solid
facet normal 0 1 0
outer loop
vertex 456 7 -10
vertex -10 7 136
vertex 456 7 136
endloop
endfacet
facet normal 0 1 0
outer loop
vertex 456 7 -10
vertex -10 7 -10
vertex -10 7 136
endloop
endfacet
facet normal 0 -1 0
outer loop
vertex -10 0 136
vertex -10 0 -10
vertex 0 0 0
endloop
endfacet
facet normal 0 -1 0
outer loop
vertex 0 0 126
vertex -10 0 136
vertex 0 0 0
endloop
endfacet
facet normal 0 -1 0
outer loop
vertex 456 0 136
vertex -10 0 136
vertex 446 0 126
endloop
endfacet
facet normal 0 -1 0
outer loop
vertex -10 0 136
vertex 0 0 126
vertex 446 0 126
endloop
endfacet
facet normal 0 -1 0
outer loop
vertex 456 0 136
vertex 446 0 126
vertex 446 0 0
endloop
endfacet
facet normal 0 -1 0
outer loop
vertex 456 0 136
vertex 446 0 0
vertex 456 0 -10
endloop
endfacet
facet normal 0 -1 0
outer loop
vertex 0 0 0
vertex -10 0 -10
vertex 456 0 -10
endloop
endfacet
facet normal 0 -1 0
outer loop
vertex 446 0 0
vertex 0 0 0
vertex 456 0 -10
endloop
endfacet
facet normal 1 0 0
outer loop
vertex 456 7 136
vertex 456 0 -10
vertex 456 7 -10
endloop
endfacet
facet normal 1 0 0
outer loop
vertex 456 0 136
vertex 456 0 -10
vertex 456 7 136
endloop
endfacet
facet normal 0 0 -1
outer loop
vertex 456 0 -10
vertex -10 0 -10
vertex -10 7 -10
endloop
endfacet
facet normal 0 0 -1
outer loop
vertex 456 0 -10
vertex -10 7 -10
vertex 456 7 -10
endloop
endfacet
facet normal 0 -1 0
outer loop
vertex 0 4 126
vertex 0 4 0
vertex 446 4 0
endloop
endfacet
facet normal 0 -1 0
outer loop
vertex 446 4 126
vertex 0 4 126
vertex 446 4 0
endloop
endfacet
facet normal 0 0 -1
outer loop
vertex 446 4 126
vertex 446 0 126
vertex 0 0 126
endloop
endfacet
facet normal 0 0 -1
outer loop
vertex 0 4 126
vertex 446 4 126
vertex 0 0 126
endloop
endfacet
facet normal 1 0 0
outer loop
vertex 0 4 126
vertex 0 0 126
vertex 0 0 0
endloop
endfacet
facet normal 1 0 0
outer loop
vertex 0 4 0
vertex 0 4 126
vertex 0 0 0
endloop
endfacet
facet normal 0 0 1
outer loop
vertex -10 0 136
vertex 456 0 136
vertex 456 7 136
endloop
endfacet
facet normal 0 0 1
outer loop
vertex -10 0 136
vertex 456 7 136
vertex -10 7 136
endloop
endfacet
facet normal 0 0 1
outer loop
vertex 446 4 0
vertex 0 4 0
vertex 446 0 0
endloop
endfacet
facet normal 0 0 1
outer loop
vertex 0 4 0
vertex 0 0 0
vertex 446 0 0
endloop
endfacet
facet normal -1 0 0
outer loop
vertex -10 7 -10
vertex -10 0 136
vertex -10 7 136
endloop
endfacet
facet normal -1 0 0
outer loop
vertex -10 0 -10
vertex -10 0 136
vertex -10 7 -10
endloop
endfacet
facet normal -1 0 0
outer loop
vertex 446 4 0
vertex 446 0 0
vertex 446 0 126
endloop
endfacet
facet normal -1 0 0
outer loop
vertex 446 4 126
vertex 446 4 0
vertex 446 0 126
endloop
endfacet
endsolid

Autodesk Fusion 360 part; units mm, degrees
sketch "Sketch1" plane through (0, 0, 0) normal (0, 1, 0) x (1, 0, 0)
  line L0 (0, 0) -> (446, 0)
  line L1 (446, 0) -> (446, -126)
  line L2 (446, -126) -> (0, -126)
  line L3 (0, -126) -> (0, 0)
  line L4 (-10, 10) -> (456, 10)
  line L5 (456, 10) -> (456, -136)
  line L6 (456, -136) -> (-10, -136)
  line L7 (-10, -136) -> (-10, 10)
  dimension "d1" = 446
  dimension "d2" = 126
  dimension "d3" = 466
  dimension "d4" = 146
  dimension "d5" = 10
  dimension "d6" = 10
extrude "Extrude1" add sketch "Sketch1" along normal blind 5 contours L0 L1 L2 L3 | L4 L5 L6 L7
extrude "Extrude2" cut sketch "Sketch1" along normal blind 4 contours L0 L1 L2 L3
extrude "Extrude3" add 1 faces at (145.3333, 5, 38.6667) along direction (0, 1, 0) blind 2
sketch "Sketch2" plane through (0, 0, 0) normal (0, 1, 0) x (1, 0, 0)
  line L0 (9, -114) -> (23, -114)
  line L1 (23, -114) -> (23, -100)
  line L2 (23, -100) -> (9, -100)
  line L3 (9, -100) -> (9, -114)
  line L4 (28, -113.6288) -> (42, -113.6288)
  line L5 (42, -113.6288) -> (42, -99.6288)
  line L6 (42, -99.6288) -> (28, -99.6288)
  line L7 (28, -99.6288) -> (28, -113.6288)
  line L8 (0, 0) -> (0, -126)
  line L9 (0, -126) -> (446, -126)
  line L10 (47, -113.6288) -> (61, -113.6288)
  line L11 (47, -99.6288) -> (47, -113.6288)
  line L12 (61, -113.6288) -> (61, -99.6288)
  line L13 (61, -99.6288) -> (47, -99.6288)
  line L14 (80, -113.6288) -> (80, -99.6288)
  line L15 (66, -113.6288) -> (80, -113.6288)
  line L16 (66, -99.6288) -> (66, -113.6288)
  line L17 (80, -99.6288) -> (66, -99.6288)
  line L18 (156, -113.6288) -> (156, -99.6288)
  line L19 (142, -113.6288) -> (156, -113.6288)
  line L20 (142, -99.6288) -> (142, -113.6288)
  line L21 (156, -99.6288) -> (142, -99.6288)
  line L22 (137, -113.6288) -> (137, -99.6288)
  line L23 (123, -99.6288) -> (123, -113.6288)
  line L24 (123, -113.6288) -> (137, -113.6288)
  line L25 (137, -99.6288) -> (123, -99.6288)
  line L26 (118, -113.6288) -> (118, -99.6288)
  line L27 (104, -113.6288) -> (118, -113.6288)
  line L28 (104, -99.6288) -> (104, -113.6288)
  line L29 (118, -99.6288) -> (104, -99.6288)
  line L30 (99, -114) -> (99, -100)
  line L31 (85, -114) -> (99, -114)
  line L32 (85, -100) -> (85, -114)
  line L33 (99, -100) -> (85, -100)
  line L34 (307.2, -113.6288) -> (321.2, -113.6288)
  line L35 (218, -113.6288) -> (232, -113.6288)
  line L36 (345.2, -113.6288) -> (359.2, -113.6288)
  line L37 (307.2, -99.6288) -> (307.2, -113.6288)
  line L38 (161, -114) -> (175, -114)
  line L39 (232, -113.6288) -> (232, -99.6288)
  line L40 (345.2, -99.6288) -> (345.2, -113.6288)
  line L41 (359.2, -99.6288) -> (345.2, -99.6288)
  line L42 (340.2, -113.6288) -> (340.2, -99.6288)
  line L43 (326.2, -99.6288) -> (326.2, -113.6288)
  line L44 (326.2, -113.6288) -> (340.2, -113.6288)
  line L45 (359.2, -113.6288) -> (359.2, -99.6288)
  line L46 (340.2, -99.6288) -> (326.2, -99.6288)
  line L47 (321.2, -113.6288) -> (321.2, -99.6288)
  line L48 (237, -114) -> (251, -114)
  line L49 (251, -114) -> (251, -100)
  line L50 (321.2, -99.6288) -> (307.2, -99.6288)
  line L51 (232, -99.6288) -> (218, -99.6288)
  line L52 (237, -100) -> (237, -114)
  line L53 (251, -100) -> (237, -100)
  line L54 (161, -100) -> (161, -114)
  line L55 (175, -114) -> (175, -100)
  line L56 (175, -100) -> (161, -100)
  line L57 (180, -99.6288) -> (180, -113.6288)
  line L58 (218, -99.6288) -> (218, -113.6288)
  line L59 (194, -113.6288) -> (194, -99.6288)
  line L60 (199, -113.6288) -> (213, -113.6288)
  line L61 (199, -99.6288) -> (199, -113.6288)
  line L62 (213, -113.6288) -> (213, -99.6288)
  line L63 (213, -99.6288) -> (199, -99.6288)
  line L64 (180, -113.6288) -> (194, -113.6288)
  line L65 (194, -99.6288) -> (180, -99.6288)
  line L66 (321.2, -94.6288) -> (321.2, -80.6288)
  line L67 (85, -95) -> (99, -95)
  line L68 (307.2, -80.6288) -> (307.2, -94.6288)
  line L69 (345.2, -94.6288) -> (359.2, -94.6288)
  line L70 (85, -81) -> (85, -95)
  line L71 (80, -80.6288) -> (66, -80.6288)
  line L72 (326.2, -94.6288) -> (340.2, -94.6288)
  line L73 (66, -94.6288) -> (80, -94.6288)
  line L74 (321.2, -80.6288) -> (307.2, -80.6288)
  line L75 (251, -95) -> (251, -81)
  line L76 (307.2, -94.6288) -> (321.2, -94.6288)
  line L77 (175, -81) -> (161, -81)
  line L78 (345.2, -80.6288) -> (345.2, -94.6288)
  line L79 (237, -81) -> (237, -95)
  line L80 (340.2, -94.6288) -> (340.2, -80.6288)
  line L81 (326.2, -80.6288) -> (326.2, -94.6288)
  line L82 (194, -80.6288) -> (180, -80.6288)
  line L83 (175, -95) -> (175, -81)
  line L84 (199, -80.6288) -> (199, -94.6288)
  line L85 (218, -94.6288) -> (232, -94.6288)
  line L86 (359.2, -80.6288) -> (345.2, -80.6288)
  line L87 (180, -80.6288) -> (180, -94.6288)
  line L88 (194, -94.6288) -> (194, -80.6288)
  line L89 (237, -95) -> (251, -95)
  line L90 (232, -94.6288) -> (232, -80.6288)
  line L91 (218, -80.6288) -> (218, -94.6288)
  line L92 (340.2, -80.6288) -> (326.2, -80.6288)
  line L93 (213, -80.6288) -> (199, -80.6288)
  line L94 (161, -95) -> (175, -95)
  line L95 (251, -81) -> (237, -81)
  line L96 (156, -94.6288) -> (156, -80.6288)
  line L97 (199, -94.6288) -> (213, -94.6288)
  line L98 (213, -94.6288) -> (213, -80.6288)
  line L99 (232, -80.6288) -> (218, -80.6288)
  line L100 (161, -81) -> (161, -95)
  line L101 (180, -94.6288) -> (194, -94.6288)
  line L102 (61, -94.6288) -> (61, -80.6288)
  line L103 (156, -80.6288) -> (142, -80.6288)
  line L104 (42, -80.6288) -> (28, -80.6288)
  line L105 (28, -80.6288) -> (28, -94.6288)
  line L106 (9, -81) -> (9, -95)
  line L107 (142, -94.6288) -> (156, -94.6288)
  line L108 (61, -80.6288) -> (47, -80.6288)
  line L109 (23, -81) -> (9, -81)
  line L110 (47, -94.6288) -> (61, -94.6288)
  line L111 (66, -80.6288) -> (66, -94.6288)
  line L112 (47, -80.6288) -> (47, -94.6288)
  line L113 (9, -95) -> (23, -95)
  line L114 (123, -80.6288) -> (123, -94.6288)
  line L115 (42, -94.6288) -> (42, -80.6288)
  line L116 (28, -94.6288) -> (42, -94.6288)
  line L117 (23, -95) -> (23, -81)
  line L118 (118, -94.6288) -> (118, -80.6288)
  line L119 (137, -80.6288) -> (123, -80.6288)
  line L120 (99, -81) -> (85, -81)
  line L121 (123, -94.6288) -> (137, -94.6288)
  line L122 (104, -94.6288) -> (118, -94.6288)
  line L123 (104, -80.6288) -> (104, -94.6288)
  line L124 (137, -94.6288) -> (137, -80.6288)
  line L125 (80, -94.6288) -> (80, -80.6288)
  line L126 (142, -80.6288) -> (142, -94.6288)
  line L127 (118, -80.6288) -> (104, -80.6288)
  line L128 (359.2, -94.6288) -> (359.2, -80.6288)
  line L129 (99, -95) -> (99, -81)
  line L130 (237, -62) -> (237, -76)
  line L131 (232, -61.6288) -> (218, -61.6288)
  line L132 (251, -62) -> (237, -62)
  line L133 (213, -75.6288) -> (213, -61.6288)
  line L134 (194, -75.6288) -> (194, -61.6288)
  line L135 (180, -61.6288) -> (180, -75.6288)
  line L136 (175, -62) -> (161, -62)
  line L137 (156, -75.6288) -> (156, -61.6288)
  line L138 (194, -61.6288) -> (180, -61.6288)
  line L139 (161, -62) -> (161, -76)
  line L140 (251, -76) -> (251, -62)
  line L141 (218, -61.6288) -> (218, -75.6288)
  line L142 (232, -75.6288) -> (232, -61.6288)
  line L143 (218, -75.6288) -> (232, -75.6288)
  line L144 (326.2, -61.6288) -> (326.2, -75.6288)
  line L145 (307.2, -61.6288) -> (307.2, -75.6288)
  line L146 (359.2, -75.6288) -> (359.2, -61.6288)
  line L147 (359.2, -61.6288) -> (345.2, -61.6288)
  line L148 (156, -61.6288) -> (142, -61.6288)
  line L149 (142, -75.6288) -> (156, -75.6288)
  line L150 (307.2, -75.6288) -> (321.2, -75.6288)
  line L151 (326.2, -75.6288) -> (340.2, -75.6288)
  line L152 (340.2, -61.6288) -> (326.2, -61.6288)
  line L153 (321.2, -61.6288) -> (307.2, -61.6288)
  line L154 (199, -75.6288) -> (213, -75.6288)
  line L155 (213, -61.6288) -> (199, -61.6288)
  line L156 (104, -75.6288) -> (118, -75.6288)
  line L157 (118, -75.6288) -> (118, -61.6288)
  line L158 (345.2, -75.6288) -> (359.2, -75.6288)
  line L159 (137, -75.6288) -> (137, -61.6288)
  line L160 (42, -75.6288) -> (42, -61.6288)
  line L161 (99, -76) -> (99, -62)
  line L162 (99, -62) -> (85, -62)
  line L163 (66, -61.6288) -> (66, -75.6288)
  line L164 (123, -61.6288) -> (123, -75.6288)
  line L165 (47, -75.6288) -> (61, -75.6288)
  line L166 (80, -75.6288) -> (80, -61.6288)
  line L167 (142, -61.6288) -> (142, -75.6288)
  line L168 (66, -75.6288) -> (80, -75.6288)
  line L169 (42, -61.6288) -> (28, -61.6288)
  line L170 (345.2, -61.6288) -> (345.2, -75.6288)
  line L171 (340.2, -75.6288) -> (340.2, -61.6288)
  line L172 (321.2, -75.6288) -> (321.2, -61.6288)
  line L173 (123, -75.6288) -> (137, -75.6288)
  line L174 (118, -61.6288) -> (104, -61.6288)
  line L175 (137, -61.6288) -> (123, -61.6288)
  line L176 (104, -61.6288) -> (104, -75.6288)
  line L177 (85, -62) -> (85, -76)
  line L178 (80, -61.6288) -> (66, -61.6288)
  line L179 (28, -75.6288) -> (42, -75.6288)
  line L180 (9, -62) -> (9, -76)
  line L181 (23, -62) -> (9, -62)
  line L182 (47, -61.6288) -> (47, -75.6288)
  line L183 (23, -76) -> (23, -62)
  line L184 (61, -61.6288) -> (47, -61.6288)
  line L185 (28, -61.6288) -> (28, -75.6288)
  line L186 (61, -75.6288) -> (61, -61.6288)
  line L187 (199, -61.6288) -> (199, -75.6288)
  line L188 (175, -76) -> (175, -62)
  line L189 (180, -75.6288) -> (194, -75.6288)
  line L190 (9, -76) -> (23, -76)
  line L191 (85, -76) -> (99, -76)
  line L192 (161, -76) -> (175, -76)
  line L193 (237, -76) -> (251, -76)
  line L194 (213, -42.6288) -> (199, -42.6288)
  line L195 (66, -56.6288) -> (80, -56.6288)
  line L196 (104, -56.6288) -> (118, -56.6288)
  line L197 (251, -43) -> (237, -43)
  line L198 (9, -43) -> (9, -57)
  line L199 (47, -42.6288) -> (47, -56.6288)
  line L200 (213, -56.6288) -> (213, -42.6288)
  line L201 (42, -42.6288) -> (28, -42.6288)
  line L202 (28, -42.6288) -> (28, -56.6288)
  line L203 (61, -56.6288) -> (61, -42.6288)
  line L204 (232, -56.6288) -> (232, -42.6288)
  line L205 (232, -42.6288) -> (218, -42.6288)
  line L206 (28, -56.6288) -> (42, -56.6288)
  line L207 (180, -42.6288) -> (180, -56.6288)
  line L208 (80, -42.6288) -> (66, -42.6288)
  line L209 (237, -43) -> (237, -57)
  line L210 (47, -56.6288) -> (61, -56.6288)
  line L211 (237, -57) -> (251, -57)
  line L212 (218, -42.6288) -> (218, -56.6288)
  line L213 (118, -42.6288) -> (104, -42.6288)
  line L214 (199, -56.6288) -> (213, -56.6288)
  line L215 (218, -56.6288) -> (232, -56.6288)
  line L216 (23, -57) -> (23, -43)
  line L217 (61, -42.6288) -> (47, -42.6288)
  line L218 (251, -57) -> (251, -43)
  line L219 (23, -43) -> (9, -43)
  line L220 (42, -56.6288) -> (42, -42.6288)
  line L221 (9, -57) -> (23, -57)
  line L222 (66, -42.6288) -> (66, -56.6288)
  line L223 (104, -42.6288) -> (104, -56.6288)
  line L224 (142, -56.6288) -> (156, -56.6288)
  line L225 (156, -42.6288) -> (142, -42.6288)
  line L226 (85, -57) -> (99, -57)
  line L227 (85, -43) -> (85, -57)
  line L228 (194, -56.6288) -> (194, -42.6288)
  line L229 (99, -57) -> (99, -43)
  line L230 (199, -42.6288) -> (199, -56.6288)
  line L231 (194, -42.6288) -> (180, -42.6288)
  line L232 (175, -43) -> (161, -43)
  line L233 (161, -43) -> (161, -57)
  line L234 (80, -56.6288) -> (80, -42.6288)
  line L235 (99, -43) -> (85, -43)
  line L236 (180, -56.6288) -> (194, -56.6288)
  line L237 (156, -56.6288) -> (156, -42.6288)
  line L238 (175, -57) -> (175, -43)
  line L239 (137, -56.6288) -> (137, -42.6288)
  line L240 (123, -56.6288) -> (137, -56.6288)
  line L241 (118, -56.6288) -> (118, -42.6288)
  line L242 (123, -42.6288) -> (123, -56.6288)
  line L243 (142, -42.6288) -> (142, -56.6288)
  line L244 (161, -57) -> (175, -57)
  line L245 (137, -42.6288) -> (123, -42.6288)
  line L246 (237, -5) -> (237, -19)
  line L247 (237, -38) -> (251, -38)
  line L248 (218, -37.6288) -> (232, -37.6288)
  line L249 (199, -37.6288) -> (213, -37.6288)
  line L250 (237, -24) -> (237, -38)
  line L251 (156, -4.6288) -> (142, -4.6288)
  line L252 (23, -19) -> (23, -5)
  line L253 (218, -18.6288) -> (232, -18.6288)
  line L254 (251, -24) -> (237, -24)
  line L255 (47, -4.6288) -> (47, -18.6288)
  line L256 (251, -5) -> (237, -5)
  line L257 (142, -18.6288) -> (156, -18.6288)
  line L258 (213, -37.6288) -> (213, -23.6288)
  line L259 (232, -23.6288) -> (218, -23.6288)
  line L260 (213, -18.6288) -> (213, -4.6288)
  line L261 (218, -4.6288) -> (218, -18.6288)
  line L262 (251, -19) -> (251, -5)
  line L263 (237, -19) -> (251, -19)
  line L264 (156, -23.6288) -> (142, -23.6288)
  line L265 (251, -38) -> (251, -24)
  line L266 (213, -4.6288) -> (199, -4.6288)
  line L267 (232, -4.6288) -> (218, -4.6288)
  line L268 (232, -18.6288) -> (232, -4.6288)
  line L269 (232, -37.6288) -> (232, -23.6288)
  line L270 (218, -23.6288) -> (218, -37.6288)
  line L271 (199, -18.6288) -> (213, -18.6288)
  line L272 (213, -23.6288) -> (199, -23.6288)
  line L273 (61, -18.6288) -> (61, -4.6288)
  line L274 (42, -18.6288) -> (42, -4.6288)
  line L275 (137, -18.6288) -> (137, -4.6288)
  line L276 (9, -5) -> (9, -19)
  line L277 (28, -4.6288) -> (28, -18.6288)
  line L278 (61, -4.6288) -> (47, -4.6288)
  line L279 (137, -4.6288) -> (123, -4.6288)
  line L280 (118, -18.6288) -> (118, -4.6288)
  line L281 (99, -19) -> (99, -5)
  line L282 (66, -37.6288) -> (80, -37.6288)
  line L283 (80, -23.6288) -> (66, -23.6288)
  line L284 (66, -18.6288) -> (80, -18.6288)
  line L285 (28, -18.6288) -> (42, -18.6288)
  line L286 (118, -23.6288) -> (104, -23.6288)
  line L287 (9, -19) -> (23, -19)
  line L288 (9, -24) -> (9, -38)
  line L289 (142, -4.6288) -> (142, -18.6288)
  line L290 (104, -4.6288) -> (104, -18.6288)
  line L291 (66, -4.6288) -> (66, -18.6288)
  line L292 (47, -23.6288) -> (47, -37.6288)
  line L293 (80, -18.6288) -> (80, -4.6288)
  line L294 (80, -4.6288) -> (66, -4.6288)
  line L295 (85, -5) -> (85, -19)
  line L296 (99, -5) -> (85, -5)
  line L297 (123, -4.6288) -> (123, -18.6288)
  line L298 (118, -4.6288) -> (104, -4.6288)
  line L299 (23, -5) -> (9, -5)
  line L300 (42, -4.6288) -> (28, -4.6288)
  line L301 (175, -38) -> (175, -24)
  line L302 (142, -37.6288) -> (156, -37.6288)
  line L303 (175, -24) -> (161, -24)
  line L304 (156, -37.6288) -> (156, -23.6288)
  line L305 (180, -23.6288) -> (180, -37.6288)
  line L306 (161, -19) -> (175, -19)
  line L307 (180, -18.6288) -> (194, -18.6288)
  line L308 (175, -5) -> (161, -5)
  line L309 (194, -4.6288) -> (180, -4.6288)
  line L310 (175, -19) -> (175, -5)
  line L311 (161, -24) -> (161, -38)
  line L312 (194, -37.6288) -> (194, -23.6288)
  line L313 (194, -23.6288) -> (180, -23.6288)
  line L314 (199, -23.6288) -> (199, -37.6288)
  line L315 (194, -18.6288) -> (194, -4.6288)
  line L316 (161, -5) -> (161, -19)
  line L317 (180, -4.6288) -> (180, -18.6288)
  line L318 (199, -4.6288) -> (199, -18.6288)
  line L319 (156, -18.6288) -> (156, -4.6288)
  line L320 (180, -37.6288) -> (194, -37.6288)
  line L321 (161, -38) -> (175, -38)
  line L322 (66, -23.6288) -> (66, -37.6288)
  line L323 (104, -23.6288) -> (104, -37.6288)
  line L324 (9, -38) -> (23, -38)
  line L325 (137, -23.6288) -> (123, -23.6288)
  line L326 (23, -38) -> (23, -24)
  line L327 (85, -24) -> (85, -38)
  line L328 (42, -37.6288) -> (42, -23.6288)
  line L329 (23, -24) -> (9, -24)
  line L330 (104, -37.6288) -> (118, -37.6288)
  line L331 (118, -37.6288) -> (118, -23.6288)
  line L332 (47, -18.6288) -> (61, -18.6288)
  line L333 (123, -18.6288) -> (137, -18.6288)
  line L334 (28, -23.6288) -> (28, -37.6288)
  line L335 (142, -23.6288) -> (142, -37.6288)
  line L336 (104, -18.6288) -> (118, -18.6288)
  line L337 (123, -23.6288) -> (123, -37.6288)
  line L338 (99, -38) -> (99, -24)
  line L339 (123, -37.6288) -> (137, -37.6288)
  line L340 (61, -37.6288) -> (61, -23.6288)
  line L341 (61, -23.6288) -> (47, -23.6288)
  line L342 (80, -37.6288) -> (80, -23.6288)
  line L343 (85, -38) -> (99, -38)
  line L344 (28, -37.6288) -> (42, -37.6288)
  line L345 (42, -23.6288) -> (28, -23.6288)
  line L346 (47, -37.6288) -> (61, -37.6288)
  line L347 (137, -37.6288) -> (137, -23.6288)
  line L348 (99, -24) -> (85, -24)
  line L349 (85, -19) -> (99, -19)
  line L350 (340.2, -37.6288) -> (340.2, -23.6288)
  line L351 (326.2, -23.6288) -> (326.2, -37.6288)
  line L352 (340.2, -23.6288) -> (326.2, -23.6288)
  line L353 (326.2, -37.6288) -> (340.2, -37.6288)
  line L354 (326.2, -18.6288) -> (340.2, -18.6288)
  line L355 (359.2, -4.6288) -> (345.2, -4.6288)
  line L356 (321.2, -4.6288) -> (307.2, -4.6288)
  line L357 (326.2, -4.6288) -> (326.2, -18.6288)
  line L358 (340.2, -18.6288) -> (340.2, -4.6288)
  line L359 (307.2, -18.6288) -> (321.2, -18.6288)
  line L360 (307.2, -4.6288) -> (307.2, -18.6288)
  line L361 (340.2, -4.6288) -> (326.2, -4.6288)
  line L362 (345.2, -18.6288) -> (359.2, -18.6288)
  line L363 (359.2, -18.6288) -> (359.2, -4.6288)
  line L364 (345.2, -4.6288) -> (345.2, -18.6288)
  line L365 (321.2, -18.6288) -> (321.2, -4.6288)
  dimension "d13" = 14
  dimension "d14" = 14
  dimension "d15" = 14
  dimension "d16" = 14
  dimension "d17" = 5
  dimension "d18" = 9
  dimension "d19" = 12
  dimension "d20" = 14
  dimension "d21" = 14
  dimension "d22" = 14
  dimension "d23" = 14
  dimension "d24" = 5
  dimension "d25" = 5
  dimension "d26" = 14
  dimension "d27" = 14
  dimension "d28" = 14
  dimension "d29" = 14
  dimension "d30" = 5
  dimension "d31" = 14
  dimension "d32" = 14
  dimension "d33" = 14
  dimension "d34" = 14
  dimension "d35" = 5
  dimension "d36" = 5
  dimension "d37" = 5
  dimension "d38" = 14
  dimension "d39" = 14
  dimension "d40" = 14
  dimension "d41" = 14
  dimension "d42" = 5
  dimension "d43" = 14
  dimension "d44" = 14
  dimension "d45" = 14
  dimension "d46" = 14
  dimension "d47" = 5
  dimension "d48" = 5
  dimension "d49" = 14
  dimension "d50" = 14
  dimension "d51" = 14
  dimension "d52" = 14
  dimension "d53" = 56.2
  dimension "d54" = 14
  dimension "d55" = 14
  dimension "d56" = 14
  dimension "d57" = 14
  dimension "d58" = 5
  dimension "d59" = 5
  dimension "d60" = 5
  dimension "d61" = 5
  dimension "d62" = 14
  dimension "d63" = 14
  dimension "d64" = 14
  dimension "d65" = 14
  dimension "d66" = 5
  dimension "d67" = 14
  dimension "d68" = 14
  dimension "d69" = 14
  dimension "d70" = 14
  dimension "d71" = 5
  dimension "d72" = 5
  dimension "d73" = 14
  dimension "d74" = 14
  dimension "d75" = 14
  dimension "d76" = 14
  dimension "d77" = 5
  dimension "d78" = 14
  dimension "d79" = 14
  dimension "d80" = 14
  dimension "d81" = 14
  dimension "d82" = 5
  dimension "d83" = 5
  dimension "d84" = 5
  dimension "d85" = 14
  dimension "d86" = 14
  dimension "d87" = 14
  dimension "d88" = 14
  dimension "d89" = 5
  dimension "d90" = 14
  dimension "d91" = 14
  dimension "d92" = 14
  dimension "d93" = 14
  dimension "d94" = 5
  dimension "d95" = 5
  dimension "d96" = 14
  dimension "d97" = 14
  dimension "d98" = 14
  dimension "d99" = 14
  dimension "d100" = 56.2
  dimension "d101" = 14
  dimension "d102" = 14
  dimension "d103" = 14
  dimension "d104" = 14
  dimension "d105" = 5
  dimension "d106" = 5
  dimension "d107" = 5
  dimension "d108" = 5
  dimension "d109" = 14
  dimension "d110" = 14
  dimension "d111" = 14
  dimension "d112" = 14
  dimension "d113" = 5
  dimension "d114" = 14
  dimension "d115" = 14
  dimension "d116" = 14
  dimension "d117" = 14
  dimension "d118" = 5
  dimension "d119" = 5
  dimension "d120" = 14
  dimension "d121" = 14
  dimension "d122" = 14
  dimension "d123" = 14
  dimension "d124" = 5
  dimension "d125" = 14
  dimension "d126" = 14
  dimension "d127" = 14
  dimension "d128" = 14
  dimension "d129" = 5
  dimension "d130" = 5
  dimension "d131" = 5
  dimension "d132" = 14
  dimension "d133" = 14
  dimension "d134" = 14
  dimension "d135" = 14
  dimension "d136" = 5
  dimension "d137" = 14
  dimension "d138" = 14
  dimension "d139" = 14
  dimension "d140" = 14
  dimension "d141" = 5
  dimension "d142" = 5
  dimension "d143" = 14
  dimension "d144" = 14
  dimension "d145" = 14
  dimension "d146" = 14
  dimension "d147" = 56.2
  dimension "d148" = 14
  dimension "d149" = 14
  dimension "d150" = 14
  dimension "d151" = 14
  dimension "d152" = 5
  dimension "d153" = 5
  dimension "d154" = 5
  dimension "d155" = 5
  dimension "d156" = 14
  dimension "d157" = 14
  dimension "d158" = 14
  dimension "d159" = 14
  dimension "d160" = 14
  dimension "d161" = 14
  dimension "d162" = 14
  dimension "d163" = 14
  dimension "d164" = 5
  dimension "d165" = 14
  dimension "d166" = 14
  dimension "d167" = 14
  dimension "d168" = 14
  dimension "d169" = 5
  dimension "d170" = 5
  dimension "d171" = 14
  dimension "d172" = 14
  dimension "d173" = 14
  dimension "d174" = 14
  dimension "d175" = 5
  dimension "d176" = 14
  dimension "d177" = 14
  dimension "d178" = 14
  dimension "d179" = 14
  dimension "d180" = 5
  dimension "d181" = 5
  dimension "d182" = 5
  dimension "d183" = 14
  dimension "d184" = 14
  dimension "d185" = 14
  dimension "d186" = 14
  dimension "d187" = 5
  dimension "d188" = 14
  dimension "d189" = 14
  dimension "d190" = 14
  dimension "d191" = 14
  dimension "d192" = 5
  dimension "d193" = 5
  dimension "d194" = 14
  dimension "d195" = 14
  dimension "d196" = 5
  dimension "d197" = 5
  dimension "d198" = 14
  dimension "d199" = 14
  dimension "d200" = 14
  dimension "d201" = 14
  dimension "d202" = 14
  dimension "d203" = 14
  dimension "d204" = 14
  dimension "d205" = 14
  dimension "d206" = 5
  dimension "d207" = 14
  dimension "d208" = 14
  dimension "d209" = 14
  dimension "d210" = 14
  dimension "d211" = 5
  dimension "d212" = 5
  dimension "d213" = 14
  dimension "d214" = 14
  dimension "d215" = 14
  dimension "d216" = 14
  dimension "d217" = 5
  dimension "d218" = 14
  dimension "d219" = 14
  dimension "d220" = 14
  dimension "d221" = 14
  dimension "d222" = 5
  dimension "d223" = 5
  dimension "d224" = 5
  dimension "d225" = 14
  dimension "d226" = 14
  dimension "d227" = 14
  dimension "d228" = 14
  dimension "d229" = 5
  dimension "d230" = 14
  dimension "d231" = 14
  dimension "d232" = 14
  dimension "d233" = 14
  dimension "d234" = 5
  dimension "d235" = 5
  dimension "d236" = 14
  dimension "d237" = 14
  dimension "d238" = 5
  dimension "d239" = 5
  dimension "d240" = 14
  dimension "d241" = 14
  dimension "d242" = 14
  dimension "d243" = 14
  dimension "d244" = 14
  dimension "d245" = 14
  dimension "d246" = 14
  dimension "d247" = 14
  dimension "d248" = 5
  dimension "d249" = 14
  dimension "d250" = 14
  dimension "d251" = 14
  dimension "d252" = 14
  dimension "d253" = 5
  dimension "d254" = 5
  dimension "d255" = 14
  dimension "d256" = 14
  dimension "d257" = 14
  dimension "d258" = 14
  dimension "d259" = 5
  dimension "d260" = 14
  dimension "d261" = 14
  dimension "d262" = 14
  dimension "d263" = 14
  dimension "d264" = 5
  dimension "d265" = 5
  dimension "d266" = 5
  dimension "d267" = 14
  dimension "d268" = 14
  dimension "d269" = 14
  dimension "d270" = 14
  dimension "d271" = 5
  dimension "d272" = 14
  dimension "d273" = 14
  dimension "d274" = 14
  dimension "d275" = 14
  dimension "d276" = 5
  dimension "d277" = 5
  dimension "d278" = 14
  dimension "d279" = 14
  dimension "d280" = 5
  dimension "d281" = 5
  dimension "d282" = 14
  dimension "d283" = 14
  dimension "d284" = 14
  dimension "d285" = 14
  dimension "d286" = 14
  dimension "d287" = 14
  dimension "d288" = 24
  dimension "d289" = 14
  dimension "d290" = 14
  dimension "d291" = 14
  dimension "d292" = 14
  dimension "d293" = 14
  dimension "d294" = 14
  dimension "d295" = 5
  dimension "d296" = 5
